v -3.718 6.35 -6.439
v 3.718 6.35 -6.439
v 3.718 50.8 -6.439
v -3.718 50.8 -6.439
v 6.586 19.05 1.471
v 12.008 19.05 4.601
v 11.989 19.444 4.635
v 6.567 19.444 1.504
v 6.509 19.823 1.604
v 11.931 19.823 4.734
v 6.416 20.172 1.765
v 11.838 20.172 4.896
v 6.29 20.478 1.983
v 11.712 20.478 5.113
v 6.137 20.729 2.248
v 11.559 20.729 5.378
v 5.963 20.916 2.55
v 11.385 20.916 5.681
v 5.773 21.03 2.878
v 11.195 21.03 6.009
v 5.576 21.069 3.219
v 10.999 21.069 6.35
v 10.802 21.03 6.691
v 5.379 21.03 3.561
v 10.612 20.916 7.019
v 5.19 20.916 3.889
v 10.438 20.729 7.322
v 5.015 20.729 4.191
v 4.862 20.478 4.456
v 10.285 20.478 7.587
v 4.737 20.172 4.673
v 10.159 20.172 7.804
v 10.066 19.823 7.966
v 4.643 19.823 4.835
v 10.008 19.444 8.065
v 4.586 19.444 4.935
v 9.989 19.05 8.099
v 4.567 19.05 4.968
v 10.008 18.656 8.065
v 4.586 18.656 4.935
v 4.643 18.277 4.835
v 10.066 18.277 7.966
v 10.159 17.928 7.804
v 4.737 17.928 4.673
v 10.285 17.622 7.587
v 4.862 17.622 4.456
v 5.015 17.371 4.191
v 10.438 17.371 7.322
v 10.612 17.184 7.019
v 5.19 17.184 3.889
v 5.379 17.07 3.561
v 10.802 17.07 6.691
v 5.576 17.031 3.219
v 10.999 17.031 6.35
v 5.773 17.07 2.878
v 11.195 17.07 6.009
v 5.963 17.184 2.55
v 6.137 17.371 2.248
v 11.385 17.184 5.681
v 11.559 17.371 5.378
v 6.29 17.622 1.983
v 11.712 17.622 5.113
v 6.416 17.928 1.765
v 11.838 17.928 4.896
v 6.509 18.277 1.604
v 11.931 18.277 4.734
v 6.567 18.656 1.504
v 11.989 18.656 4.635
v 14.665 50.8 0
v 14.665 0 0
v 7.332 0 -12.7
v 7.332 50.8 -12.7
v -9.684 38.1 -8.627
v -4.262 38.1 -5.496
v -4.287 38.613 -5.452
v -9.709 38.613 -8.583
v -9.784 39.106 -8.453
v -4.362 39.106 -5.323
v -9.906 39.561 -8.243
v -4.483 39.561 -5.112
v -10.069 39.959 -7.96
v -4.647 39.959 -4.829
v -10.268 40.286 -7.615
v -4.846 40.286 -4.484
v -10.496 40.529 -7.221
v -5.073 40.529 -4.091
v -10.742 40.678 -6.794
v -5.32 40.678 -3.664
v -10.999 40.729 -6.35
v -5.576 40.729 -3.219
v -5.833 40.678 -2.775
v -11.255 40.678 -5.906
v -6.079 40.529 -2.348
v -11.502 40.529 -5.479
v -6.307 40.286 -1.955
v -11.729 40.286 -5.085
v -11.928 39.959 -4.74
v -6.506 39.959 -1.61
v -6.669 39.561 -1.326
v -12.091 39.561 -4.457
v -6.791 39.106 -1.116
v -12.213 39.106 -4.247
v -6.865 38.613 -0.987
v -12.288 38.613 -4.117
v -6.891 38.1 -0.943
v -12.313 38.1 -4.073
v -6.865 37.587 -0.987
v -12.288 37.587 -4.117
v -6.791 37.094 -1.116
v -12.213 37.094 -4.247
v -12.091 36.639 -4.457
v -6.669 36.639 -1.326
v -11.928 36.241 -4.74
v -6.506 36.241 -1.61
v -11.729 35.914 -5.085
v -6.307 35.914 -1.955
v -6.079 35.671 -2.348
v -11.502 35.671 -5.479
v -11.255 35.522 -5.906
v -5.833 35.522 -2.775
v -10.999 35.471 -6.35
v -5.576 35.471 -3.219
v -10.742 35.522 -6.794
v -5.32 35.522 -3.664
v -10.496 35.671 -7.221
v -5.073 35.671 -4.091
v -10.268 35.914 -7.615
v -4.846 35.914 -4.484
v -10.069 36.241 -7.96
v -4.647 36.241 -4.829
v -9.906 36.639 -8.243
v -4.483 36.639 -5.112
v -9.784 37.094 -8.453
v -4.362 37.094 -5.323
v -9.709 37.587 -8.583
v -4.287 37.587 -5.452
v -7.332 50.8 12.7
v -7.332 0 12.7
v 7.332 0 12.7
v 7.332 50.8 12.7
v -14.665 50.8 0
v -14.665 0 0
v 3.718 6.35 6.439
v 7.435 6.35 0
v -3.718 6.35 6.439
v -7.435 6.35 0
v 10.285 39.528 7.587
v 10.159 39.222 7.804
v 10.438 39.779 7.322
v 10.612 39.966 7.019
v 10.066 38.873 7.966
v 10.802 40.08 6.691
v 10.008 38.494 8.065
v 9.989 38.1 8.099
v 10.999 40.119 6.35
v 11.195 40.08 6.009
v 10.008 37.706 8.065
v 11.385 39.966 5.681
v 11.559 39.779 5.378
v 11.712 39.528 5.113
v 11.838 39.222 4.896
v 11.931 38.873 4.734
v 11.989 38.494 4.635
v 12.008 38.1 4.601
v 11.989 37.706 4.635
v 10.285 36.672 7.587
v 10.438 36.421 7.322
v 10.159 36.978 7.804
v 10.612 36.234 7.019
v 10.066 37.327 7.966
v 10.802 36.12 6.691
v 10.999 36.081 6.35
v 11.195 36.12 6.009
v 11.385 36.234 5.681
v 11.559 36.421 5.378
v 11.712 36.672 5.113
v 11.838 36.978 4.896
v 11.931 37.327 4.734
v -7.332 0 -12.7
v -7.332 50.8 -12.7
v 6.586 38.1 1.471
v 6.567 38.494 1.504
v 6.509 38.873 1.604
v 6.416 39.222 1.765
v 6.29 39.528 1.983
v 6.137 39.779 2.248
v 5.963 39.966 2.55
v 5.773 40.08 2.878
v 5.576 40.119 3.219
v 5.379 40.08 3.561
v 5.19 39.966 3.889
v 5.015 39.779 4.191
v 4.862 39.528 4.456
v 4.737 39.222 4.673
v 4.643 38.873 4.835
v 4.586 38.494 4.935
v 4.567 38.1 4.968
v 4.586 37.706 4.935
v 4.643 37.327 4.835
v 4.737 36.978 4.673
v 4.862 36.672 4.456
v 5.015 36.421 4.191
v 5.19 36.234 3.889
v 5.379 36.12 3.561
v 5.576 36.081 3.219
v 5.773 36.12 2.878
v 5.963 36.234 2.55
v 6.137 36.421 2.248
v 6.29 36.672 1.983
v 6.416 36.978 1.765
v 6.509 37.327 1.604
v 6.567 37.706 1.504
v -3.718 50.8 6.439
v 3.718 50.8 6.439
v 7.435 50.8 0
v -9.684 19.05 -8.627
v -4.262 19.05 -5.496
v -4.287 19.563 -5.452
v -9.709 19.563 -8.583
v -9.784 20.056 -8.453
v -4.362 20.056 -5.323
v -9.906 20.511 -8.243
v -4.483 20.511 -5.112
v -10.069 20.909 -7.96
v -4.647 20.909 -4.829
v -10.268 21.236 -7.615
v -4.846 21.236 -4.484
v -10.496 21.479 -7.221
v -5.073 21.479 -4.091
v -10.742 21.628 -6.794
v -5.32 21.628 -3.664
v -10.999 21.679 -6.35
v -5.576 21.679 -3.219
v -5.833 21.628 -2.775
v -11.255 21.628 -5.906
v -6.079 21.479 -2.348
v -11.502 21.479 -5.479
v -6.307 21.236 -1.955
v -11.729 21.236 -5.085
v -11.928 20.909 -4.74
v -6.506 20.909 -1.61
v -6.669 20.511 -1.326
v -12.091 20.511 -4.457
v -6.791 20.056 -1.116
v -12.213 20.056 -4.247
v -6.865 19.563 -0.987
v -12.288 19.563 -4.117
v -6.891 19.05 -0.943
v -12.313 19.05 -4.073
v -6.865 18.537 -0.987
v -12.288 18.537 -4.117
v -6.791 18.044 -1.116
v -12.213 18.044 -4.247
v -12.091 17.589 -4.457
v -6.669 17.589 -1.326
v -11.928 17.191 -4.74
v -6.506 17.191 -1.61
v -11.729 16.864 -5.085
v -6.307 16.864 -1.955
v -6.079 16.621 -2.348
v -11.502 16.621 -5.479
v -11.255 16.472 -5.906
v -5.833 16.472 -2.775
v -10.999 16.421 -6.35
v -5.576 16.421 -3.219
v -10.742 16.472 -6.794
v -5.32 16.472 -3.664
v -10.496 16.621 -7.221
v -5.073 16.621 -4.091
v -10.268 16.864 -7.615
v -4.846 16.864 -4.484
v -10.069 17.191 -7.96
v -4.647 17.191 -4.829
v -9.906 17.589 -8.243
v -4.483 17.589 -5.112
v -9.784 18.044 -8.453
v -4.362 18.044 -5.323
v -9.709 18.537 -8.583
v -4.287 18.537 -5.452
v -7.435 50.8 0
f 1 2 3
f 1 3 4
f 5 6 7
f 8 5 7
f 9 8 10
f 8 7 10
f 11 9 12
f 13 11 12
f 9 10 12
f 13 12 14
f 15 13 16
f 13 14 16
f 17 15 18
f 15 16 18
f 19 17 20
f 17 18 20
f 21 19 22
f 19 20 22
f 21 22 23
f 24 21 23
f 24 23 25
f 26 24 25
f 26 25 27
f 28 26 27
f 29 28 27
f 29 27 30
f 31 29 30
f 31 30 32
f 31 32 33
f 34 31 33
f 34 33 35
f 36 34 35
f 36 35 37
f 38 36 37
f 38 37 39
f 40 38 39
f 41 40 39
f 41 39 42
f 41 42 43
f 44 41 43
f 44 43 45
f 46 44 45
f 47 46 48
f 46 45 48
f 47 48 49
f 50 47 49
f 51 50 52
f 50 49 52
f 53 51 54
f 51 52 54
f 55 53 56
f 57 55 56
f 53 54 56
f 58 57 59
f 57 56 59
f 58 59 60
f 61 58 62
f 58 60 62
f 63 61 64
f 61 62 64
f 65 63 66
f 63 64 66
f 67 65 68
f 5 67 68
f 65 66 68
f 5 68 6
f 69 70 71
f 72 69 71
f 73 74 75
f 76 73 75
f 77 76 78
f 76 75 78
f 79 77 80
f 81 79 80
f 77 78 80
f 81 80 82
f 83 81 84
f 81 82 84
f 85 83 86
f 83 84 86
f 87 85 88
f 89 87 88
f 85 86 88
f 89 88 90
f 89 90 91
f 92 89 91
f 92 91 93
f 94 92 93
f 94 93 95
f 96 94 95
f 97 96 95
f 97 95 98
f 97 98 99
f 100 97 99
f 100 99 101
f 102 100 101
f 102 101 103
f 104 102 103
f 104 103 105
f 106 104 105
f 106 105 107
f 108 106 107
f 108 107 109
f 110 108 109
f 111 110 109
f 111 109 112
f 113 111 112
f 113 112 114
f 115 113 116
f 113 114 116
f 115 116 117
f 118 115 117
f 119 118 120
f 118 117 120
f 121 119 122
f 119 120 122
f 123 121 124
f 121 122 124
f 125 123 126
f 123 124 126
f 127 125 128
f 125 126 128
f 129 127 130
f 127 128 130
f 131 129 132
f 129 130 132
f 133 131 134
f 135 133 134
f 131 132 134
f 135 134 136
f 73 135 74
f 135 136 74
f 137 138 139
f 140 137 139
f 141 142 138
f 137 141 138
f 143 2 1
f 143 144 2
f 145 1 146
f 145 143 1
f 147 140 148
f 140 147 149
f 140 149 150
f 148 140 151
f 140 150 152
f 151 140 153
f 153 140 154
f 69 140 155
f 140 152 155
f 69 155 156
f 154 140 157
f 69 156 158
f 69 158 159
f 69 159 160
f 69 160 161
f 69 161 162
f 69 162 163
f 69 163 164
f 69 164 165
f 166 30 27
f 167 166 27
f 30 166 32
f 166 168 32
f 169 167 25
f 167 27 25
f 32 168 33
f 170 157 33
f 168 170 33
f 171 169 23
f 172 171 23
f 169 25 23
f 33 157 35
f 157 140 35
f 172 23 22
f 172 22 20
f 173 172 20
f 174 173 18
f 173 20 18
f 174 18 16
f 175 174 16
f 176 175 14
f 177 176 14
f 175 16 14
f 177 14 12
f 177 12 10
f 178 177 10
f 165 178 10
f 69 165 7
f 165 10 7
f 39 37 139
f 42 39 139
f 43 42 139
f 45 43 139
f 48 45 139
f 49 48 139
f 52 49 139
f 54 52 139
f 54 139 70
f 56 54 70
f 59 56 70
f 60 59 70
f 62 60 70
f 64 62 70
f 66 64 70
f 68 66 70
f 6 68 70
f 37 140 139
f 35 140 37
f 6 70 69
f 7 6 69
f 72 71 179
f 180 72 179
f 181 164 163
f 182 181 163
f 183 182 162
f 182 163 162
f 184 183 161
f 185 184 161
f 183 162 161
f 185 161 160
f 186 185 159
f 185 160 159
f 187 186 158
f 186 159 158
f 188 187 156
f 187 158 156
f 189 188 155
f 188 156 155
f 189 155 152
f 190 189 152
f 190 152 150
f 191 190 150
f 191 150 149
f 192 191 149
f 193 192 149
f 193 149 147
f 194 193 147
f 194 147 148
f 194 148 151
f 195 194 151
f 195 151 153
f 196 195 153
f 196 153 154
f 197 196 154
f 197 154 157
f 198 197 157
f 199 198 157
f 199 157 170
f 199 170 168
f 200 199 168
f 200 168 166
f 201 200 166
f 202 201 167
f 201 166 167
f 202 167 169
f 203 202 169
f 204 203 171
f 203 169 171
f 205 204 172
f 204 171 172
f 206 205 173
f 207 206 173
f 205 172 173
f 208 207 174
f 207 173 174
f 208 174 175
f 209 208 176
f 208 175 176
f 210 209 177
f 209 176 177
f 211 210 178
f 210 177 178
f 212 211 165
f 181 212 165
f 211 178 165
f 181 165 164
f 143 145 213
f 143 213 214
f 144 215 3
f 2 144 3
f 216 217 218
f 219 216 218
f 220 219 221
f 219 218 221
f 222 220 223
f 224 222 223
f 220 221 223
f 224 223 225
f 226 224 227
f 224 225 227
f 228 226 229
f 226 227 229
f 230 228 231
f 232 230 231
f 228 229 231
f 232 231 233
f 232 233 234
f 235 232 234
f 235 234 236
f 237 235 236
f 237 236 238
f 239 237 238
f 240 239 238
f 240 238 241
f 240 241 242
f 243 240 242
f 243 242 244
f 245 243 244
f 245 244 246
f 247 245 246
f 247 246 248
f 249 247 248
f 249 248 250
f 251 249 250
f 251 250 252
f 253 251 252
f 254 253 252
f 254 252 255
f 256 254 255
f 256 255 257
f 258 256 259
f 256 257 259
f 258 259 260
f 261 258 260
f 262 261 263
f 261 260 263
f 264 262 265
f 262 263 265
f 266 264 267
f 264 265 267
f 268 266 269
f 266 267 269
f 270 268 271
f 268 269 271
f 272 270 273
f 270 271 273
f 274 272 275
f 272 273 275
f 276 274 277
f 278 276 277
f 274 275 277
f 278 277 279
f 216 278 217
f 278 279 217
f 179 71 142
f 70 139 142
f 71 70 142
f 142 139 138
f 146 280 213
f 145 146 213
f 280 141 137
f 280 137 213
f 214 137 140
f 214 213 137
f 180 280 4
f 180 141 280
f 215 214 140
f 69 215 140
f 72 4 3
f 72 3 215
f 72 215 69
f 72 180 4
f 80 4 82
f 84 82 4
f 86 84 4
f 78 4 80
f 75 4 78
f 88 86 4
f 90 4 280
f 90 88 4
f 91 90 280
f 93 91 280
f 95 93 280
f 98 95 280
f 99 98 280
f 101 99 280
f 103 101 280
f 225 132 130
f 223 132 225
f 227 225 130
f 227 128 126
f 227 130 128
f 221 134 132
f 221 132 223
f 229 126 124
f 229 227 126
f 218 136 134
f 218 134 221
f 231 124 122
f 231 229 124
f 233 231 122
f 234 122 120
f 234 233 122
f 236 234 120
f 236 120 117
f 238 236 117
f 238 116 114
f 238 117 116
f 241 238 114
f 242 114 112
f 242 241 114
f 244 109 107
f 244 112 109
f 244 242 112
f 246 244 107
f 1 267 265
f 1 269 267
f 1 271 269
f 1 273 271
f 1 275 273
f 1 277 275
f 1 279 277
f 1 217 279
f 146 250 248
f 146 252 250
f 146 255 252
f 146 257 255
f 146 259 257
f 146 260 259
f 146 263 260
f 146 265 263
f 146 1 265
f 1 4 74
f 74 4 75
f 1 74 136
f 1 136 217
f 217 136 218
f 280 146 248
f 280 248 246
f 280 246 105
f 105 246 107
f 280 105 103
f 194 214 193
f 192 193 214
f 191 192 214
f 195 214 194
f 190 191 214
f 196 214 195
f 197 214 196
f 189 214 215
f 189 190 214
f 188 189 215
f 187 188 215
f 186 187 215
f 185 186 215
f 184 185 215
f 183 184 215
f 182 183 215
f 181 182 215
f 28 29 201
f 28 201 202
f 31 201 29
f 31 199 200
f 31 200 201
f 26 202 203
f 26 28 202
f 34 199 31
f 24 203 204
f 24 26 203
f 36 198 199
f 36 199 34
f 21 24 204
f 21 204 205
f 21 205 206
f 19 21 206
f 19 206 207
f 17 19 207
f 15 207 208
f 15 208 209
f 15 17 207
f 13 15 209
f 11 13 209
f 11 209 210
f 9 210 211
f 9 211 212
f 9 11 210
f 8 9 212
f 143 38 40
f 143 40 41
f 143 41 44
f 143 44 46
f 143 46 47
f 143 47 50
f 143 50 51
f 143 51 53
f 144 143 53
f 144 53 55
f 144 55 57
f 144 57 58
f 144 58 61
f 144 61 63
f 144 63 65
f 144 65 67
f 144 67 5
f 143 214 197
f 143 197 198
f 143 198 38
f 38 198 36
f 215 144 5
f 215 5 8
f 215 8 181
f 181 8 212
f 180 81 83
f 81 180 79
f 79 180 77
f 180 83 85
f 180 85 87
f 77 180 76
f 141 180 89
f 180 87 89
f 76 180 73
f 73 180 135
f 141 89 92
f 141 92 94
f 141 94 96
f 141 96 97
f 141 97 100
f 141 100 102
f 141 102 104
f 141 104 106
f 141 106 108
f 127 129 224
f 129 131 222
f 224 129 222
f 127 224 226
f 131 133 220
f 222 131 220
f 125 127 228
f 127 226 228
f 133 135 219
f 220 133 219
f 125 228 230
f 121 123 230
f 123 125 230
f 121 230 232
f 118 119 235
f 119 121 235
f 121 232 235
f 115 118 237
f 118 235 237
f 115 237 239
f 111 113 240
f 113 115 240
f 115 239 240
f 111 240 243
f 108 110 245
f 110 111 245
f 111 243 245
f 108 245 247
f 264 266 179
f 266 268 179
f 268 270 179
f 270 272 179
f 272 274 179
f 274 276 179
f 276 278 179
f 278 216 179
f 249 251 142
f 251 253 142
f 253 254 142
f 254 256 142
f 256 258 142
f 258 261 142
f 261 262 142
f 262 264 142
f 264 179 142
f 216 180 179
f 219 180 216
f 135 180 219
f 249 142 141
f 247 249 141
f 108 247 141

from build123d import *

# Parameters (mm, degrees)
BOSS_EXTRUDE1_DEPTH = 50.8
BOSS_EXTRUDE2_DEPTH = 6.35
SKETCH3_R           = 2.0193
CUT_EXTRUDE1_DEPTH  = 61.017858453
SKETCH4_R           = 2.6289
CUT_EXTRUDE2_DEPTH  = 57.954059175


with BuildPart() as part:
    # Sketch1 → Boss-Extrude1 (new body)
    with BuildSketch(Plane(origin=(0, 0, 0), x_dir=(1, 0, 0), z_dir=(0, 1, 0))):
        Polygon((7.332348419, 12.7), (-7.332348419, 12.7), (-14.664696837, 0), (-7.332348419, -12.7), (7.332348419, -12.7), (14.664696837, 0), align=None)
        Polygon((3.717500648, 6.4389), (-3.717500648, 6.4389), (-7.435001297, 0), (-3.717500648, -6.4389), (3.717500648, -6.4389), (7.435001297, 0), align=None, mode=Mode.SUBTRACT)
    extrude(amount=BOSS_EXTRUDE1_DEPTH)

    # Sketch2 → Boss-Extrude2 (add)
    with BuildSketch(Plane.XZ):
        Polygon((3.717500648, -6.4389), (-3.717500648, -6.4389), (-7.435001297, 0), (-3.717500648, 6.4389), (3.717500648, 6.4389), (7.435001297, 0), align=None)
    extrude(amount=-BOSS_EXTRUDE2_DEPTH)

    # Sketch3 → Cut-Extrude1 (cut, through all)
    with BuildSketch(Plane(origin=(10.998522628, 0, 6.35), x_dir=(0.5000000000000001, 0, -0.8660254037844386), z_dir=(0.8660254037844386, 0, 0.5000000000000001))):
        with Locations((0, 19.05)):
            Circle(SKETCH3_R)
        with Locations((0, 38.1)):
            Circle(SKETCH3_R)
    extrude(amount=-CUT_EXTRUDE1_DEPTH, mode=Mode.SUBTRACT)

    # Sketch4 → Cut-Extrude2 (cut, through all)
    with BuildSketch(Plane(origin=(-5.576250972, 0, -3.21945), x_dir=(0.49999999999999967, 0, -0.8660254037844388), z_dir=(0.8660254037844388, 0, 0.49999999999999967))):
        with Locations((0, 38.1)):
            Circle(SKETCH4_R)
        with Locations((0, 19.05)):
            Circle(SKETCH4_R)
    extrude(amount=-CUT_EXTRUDE2_DEPTH, mode=Mode.SUBTRACT)


solid = part.part
